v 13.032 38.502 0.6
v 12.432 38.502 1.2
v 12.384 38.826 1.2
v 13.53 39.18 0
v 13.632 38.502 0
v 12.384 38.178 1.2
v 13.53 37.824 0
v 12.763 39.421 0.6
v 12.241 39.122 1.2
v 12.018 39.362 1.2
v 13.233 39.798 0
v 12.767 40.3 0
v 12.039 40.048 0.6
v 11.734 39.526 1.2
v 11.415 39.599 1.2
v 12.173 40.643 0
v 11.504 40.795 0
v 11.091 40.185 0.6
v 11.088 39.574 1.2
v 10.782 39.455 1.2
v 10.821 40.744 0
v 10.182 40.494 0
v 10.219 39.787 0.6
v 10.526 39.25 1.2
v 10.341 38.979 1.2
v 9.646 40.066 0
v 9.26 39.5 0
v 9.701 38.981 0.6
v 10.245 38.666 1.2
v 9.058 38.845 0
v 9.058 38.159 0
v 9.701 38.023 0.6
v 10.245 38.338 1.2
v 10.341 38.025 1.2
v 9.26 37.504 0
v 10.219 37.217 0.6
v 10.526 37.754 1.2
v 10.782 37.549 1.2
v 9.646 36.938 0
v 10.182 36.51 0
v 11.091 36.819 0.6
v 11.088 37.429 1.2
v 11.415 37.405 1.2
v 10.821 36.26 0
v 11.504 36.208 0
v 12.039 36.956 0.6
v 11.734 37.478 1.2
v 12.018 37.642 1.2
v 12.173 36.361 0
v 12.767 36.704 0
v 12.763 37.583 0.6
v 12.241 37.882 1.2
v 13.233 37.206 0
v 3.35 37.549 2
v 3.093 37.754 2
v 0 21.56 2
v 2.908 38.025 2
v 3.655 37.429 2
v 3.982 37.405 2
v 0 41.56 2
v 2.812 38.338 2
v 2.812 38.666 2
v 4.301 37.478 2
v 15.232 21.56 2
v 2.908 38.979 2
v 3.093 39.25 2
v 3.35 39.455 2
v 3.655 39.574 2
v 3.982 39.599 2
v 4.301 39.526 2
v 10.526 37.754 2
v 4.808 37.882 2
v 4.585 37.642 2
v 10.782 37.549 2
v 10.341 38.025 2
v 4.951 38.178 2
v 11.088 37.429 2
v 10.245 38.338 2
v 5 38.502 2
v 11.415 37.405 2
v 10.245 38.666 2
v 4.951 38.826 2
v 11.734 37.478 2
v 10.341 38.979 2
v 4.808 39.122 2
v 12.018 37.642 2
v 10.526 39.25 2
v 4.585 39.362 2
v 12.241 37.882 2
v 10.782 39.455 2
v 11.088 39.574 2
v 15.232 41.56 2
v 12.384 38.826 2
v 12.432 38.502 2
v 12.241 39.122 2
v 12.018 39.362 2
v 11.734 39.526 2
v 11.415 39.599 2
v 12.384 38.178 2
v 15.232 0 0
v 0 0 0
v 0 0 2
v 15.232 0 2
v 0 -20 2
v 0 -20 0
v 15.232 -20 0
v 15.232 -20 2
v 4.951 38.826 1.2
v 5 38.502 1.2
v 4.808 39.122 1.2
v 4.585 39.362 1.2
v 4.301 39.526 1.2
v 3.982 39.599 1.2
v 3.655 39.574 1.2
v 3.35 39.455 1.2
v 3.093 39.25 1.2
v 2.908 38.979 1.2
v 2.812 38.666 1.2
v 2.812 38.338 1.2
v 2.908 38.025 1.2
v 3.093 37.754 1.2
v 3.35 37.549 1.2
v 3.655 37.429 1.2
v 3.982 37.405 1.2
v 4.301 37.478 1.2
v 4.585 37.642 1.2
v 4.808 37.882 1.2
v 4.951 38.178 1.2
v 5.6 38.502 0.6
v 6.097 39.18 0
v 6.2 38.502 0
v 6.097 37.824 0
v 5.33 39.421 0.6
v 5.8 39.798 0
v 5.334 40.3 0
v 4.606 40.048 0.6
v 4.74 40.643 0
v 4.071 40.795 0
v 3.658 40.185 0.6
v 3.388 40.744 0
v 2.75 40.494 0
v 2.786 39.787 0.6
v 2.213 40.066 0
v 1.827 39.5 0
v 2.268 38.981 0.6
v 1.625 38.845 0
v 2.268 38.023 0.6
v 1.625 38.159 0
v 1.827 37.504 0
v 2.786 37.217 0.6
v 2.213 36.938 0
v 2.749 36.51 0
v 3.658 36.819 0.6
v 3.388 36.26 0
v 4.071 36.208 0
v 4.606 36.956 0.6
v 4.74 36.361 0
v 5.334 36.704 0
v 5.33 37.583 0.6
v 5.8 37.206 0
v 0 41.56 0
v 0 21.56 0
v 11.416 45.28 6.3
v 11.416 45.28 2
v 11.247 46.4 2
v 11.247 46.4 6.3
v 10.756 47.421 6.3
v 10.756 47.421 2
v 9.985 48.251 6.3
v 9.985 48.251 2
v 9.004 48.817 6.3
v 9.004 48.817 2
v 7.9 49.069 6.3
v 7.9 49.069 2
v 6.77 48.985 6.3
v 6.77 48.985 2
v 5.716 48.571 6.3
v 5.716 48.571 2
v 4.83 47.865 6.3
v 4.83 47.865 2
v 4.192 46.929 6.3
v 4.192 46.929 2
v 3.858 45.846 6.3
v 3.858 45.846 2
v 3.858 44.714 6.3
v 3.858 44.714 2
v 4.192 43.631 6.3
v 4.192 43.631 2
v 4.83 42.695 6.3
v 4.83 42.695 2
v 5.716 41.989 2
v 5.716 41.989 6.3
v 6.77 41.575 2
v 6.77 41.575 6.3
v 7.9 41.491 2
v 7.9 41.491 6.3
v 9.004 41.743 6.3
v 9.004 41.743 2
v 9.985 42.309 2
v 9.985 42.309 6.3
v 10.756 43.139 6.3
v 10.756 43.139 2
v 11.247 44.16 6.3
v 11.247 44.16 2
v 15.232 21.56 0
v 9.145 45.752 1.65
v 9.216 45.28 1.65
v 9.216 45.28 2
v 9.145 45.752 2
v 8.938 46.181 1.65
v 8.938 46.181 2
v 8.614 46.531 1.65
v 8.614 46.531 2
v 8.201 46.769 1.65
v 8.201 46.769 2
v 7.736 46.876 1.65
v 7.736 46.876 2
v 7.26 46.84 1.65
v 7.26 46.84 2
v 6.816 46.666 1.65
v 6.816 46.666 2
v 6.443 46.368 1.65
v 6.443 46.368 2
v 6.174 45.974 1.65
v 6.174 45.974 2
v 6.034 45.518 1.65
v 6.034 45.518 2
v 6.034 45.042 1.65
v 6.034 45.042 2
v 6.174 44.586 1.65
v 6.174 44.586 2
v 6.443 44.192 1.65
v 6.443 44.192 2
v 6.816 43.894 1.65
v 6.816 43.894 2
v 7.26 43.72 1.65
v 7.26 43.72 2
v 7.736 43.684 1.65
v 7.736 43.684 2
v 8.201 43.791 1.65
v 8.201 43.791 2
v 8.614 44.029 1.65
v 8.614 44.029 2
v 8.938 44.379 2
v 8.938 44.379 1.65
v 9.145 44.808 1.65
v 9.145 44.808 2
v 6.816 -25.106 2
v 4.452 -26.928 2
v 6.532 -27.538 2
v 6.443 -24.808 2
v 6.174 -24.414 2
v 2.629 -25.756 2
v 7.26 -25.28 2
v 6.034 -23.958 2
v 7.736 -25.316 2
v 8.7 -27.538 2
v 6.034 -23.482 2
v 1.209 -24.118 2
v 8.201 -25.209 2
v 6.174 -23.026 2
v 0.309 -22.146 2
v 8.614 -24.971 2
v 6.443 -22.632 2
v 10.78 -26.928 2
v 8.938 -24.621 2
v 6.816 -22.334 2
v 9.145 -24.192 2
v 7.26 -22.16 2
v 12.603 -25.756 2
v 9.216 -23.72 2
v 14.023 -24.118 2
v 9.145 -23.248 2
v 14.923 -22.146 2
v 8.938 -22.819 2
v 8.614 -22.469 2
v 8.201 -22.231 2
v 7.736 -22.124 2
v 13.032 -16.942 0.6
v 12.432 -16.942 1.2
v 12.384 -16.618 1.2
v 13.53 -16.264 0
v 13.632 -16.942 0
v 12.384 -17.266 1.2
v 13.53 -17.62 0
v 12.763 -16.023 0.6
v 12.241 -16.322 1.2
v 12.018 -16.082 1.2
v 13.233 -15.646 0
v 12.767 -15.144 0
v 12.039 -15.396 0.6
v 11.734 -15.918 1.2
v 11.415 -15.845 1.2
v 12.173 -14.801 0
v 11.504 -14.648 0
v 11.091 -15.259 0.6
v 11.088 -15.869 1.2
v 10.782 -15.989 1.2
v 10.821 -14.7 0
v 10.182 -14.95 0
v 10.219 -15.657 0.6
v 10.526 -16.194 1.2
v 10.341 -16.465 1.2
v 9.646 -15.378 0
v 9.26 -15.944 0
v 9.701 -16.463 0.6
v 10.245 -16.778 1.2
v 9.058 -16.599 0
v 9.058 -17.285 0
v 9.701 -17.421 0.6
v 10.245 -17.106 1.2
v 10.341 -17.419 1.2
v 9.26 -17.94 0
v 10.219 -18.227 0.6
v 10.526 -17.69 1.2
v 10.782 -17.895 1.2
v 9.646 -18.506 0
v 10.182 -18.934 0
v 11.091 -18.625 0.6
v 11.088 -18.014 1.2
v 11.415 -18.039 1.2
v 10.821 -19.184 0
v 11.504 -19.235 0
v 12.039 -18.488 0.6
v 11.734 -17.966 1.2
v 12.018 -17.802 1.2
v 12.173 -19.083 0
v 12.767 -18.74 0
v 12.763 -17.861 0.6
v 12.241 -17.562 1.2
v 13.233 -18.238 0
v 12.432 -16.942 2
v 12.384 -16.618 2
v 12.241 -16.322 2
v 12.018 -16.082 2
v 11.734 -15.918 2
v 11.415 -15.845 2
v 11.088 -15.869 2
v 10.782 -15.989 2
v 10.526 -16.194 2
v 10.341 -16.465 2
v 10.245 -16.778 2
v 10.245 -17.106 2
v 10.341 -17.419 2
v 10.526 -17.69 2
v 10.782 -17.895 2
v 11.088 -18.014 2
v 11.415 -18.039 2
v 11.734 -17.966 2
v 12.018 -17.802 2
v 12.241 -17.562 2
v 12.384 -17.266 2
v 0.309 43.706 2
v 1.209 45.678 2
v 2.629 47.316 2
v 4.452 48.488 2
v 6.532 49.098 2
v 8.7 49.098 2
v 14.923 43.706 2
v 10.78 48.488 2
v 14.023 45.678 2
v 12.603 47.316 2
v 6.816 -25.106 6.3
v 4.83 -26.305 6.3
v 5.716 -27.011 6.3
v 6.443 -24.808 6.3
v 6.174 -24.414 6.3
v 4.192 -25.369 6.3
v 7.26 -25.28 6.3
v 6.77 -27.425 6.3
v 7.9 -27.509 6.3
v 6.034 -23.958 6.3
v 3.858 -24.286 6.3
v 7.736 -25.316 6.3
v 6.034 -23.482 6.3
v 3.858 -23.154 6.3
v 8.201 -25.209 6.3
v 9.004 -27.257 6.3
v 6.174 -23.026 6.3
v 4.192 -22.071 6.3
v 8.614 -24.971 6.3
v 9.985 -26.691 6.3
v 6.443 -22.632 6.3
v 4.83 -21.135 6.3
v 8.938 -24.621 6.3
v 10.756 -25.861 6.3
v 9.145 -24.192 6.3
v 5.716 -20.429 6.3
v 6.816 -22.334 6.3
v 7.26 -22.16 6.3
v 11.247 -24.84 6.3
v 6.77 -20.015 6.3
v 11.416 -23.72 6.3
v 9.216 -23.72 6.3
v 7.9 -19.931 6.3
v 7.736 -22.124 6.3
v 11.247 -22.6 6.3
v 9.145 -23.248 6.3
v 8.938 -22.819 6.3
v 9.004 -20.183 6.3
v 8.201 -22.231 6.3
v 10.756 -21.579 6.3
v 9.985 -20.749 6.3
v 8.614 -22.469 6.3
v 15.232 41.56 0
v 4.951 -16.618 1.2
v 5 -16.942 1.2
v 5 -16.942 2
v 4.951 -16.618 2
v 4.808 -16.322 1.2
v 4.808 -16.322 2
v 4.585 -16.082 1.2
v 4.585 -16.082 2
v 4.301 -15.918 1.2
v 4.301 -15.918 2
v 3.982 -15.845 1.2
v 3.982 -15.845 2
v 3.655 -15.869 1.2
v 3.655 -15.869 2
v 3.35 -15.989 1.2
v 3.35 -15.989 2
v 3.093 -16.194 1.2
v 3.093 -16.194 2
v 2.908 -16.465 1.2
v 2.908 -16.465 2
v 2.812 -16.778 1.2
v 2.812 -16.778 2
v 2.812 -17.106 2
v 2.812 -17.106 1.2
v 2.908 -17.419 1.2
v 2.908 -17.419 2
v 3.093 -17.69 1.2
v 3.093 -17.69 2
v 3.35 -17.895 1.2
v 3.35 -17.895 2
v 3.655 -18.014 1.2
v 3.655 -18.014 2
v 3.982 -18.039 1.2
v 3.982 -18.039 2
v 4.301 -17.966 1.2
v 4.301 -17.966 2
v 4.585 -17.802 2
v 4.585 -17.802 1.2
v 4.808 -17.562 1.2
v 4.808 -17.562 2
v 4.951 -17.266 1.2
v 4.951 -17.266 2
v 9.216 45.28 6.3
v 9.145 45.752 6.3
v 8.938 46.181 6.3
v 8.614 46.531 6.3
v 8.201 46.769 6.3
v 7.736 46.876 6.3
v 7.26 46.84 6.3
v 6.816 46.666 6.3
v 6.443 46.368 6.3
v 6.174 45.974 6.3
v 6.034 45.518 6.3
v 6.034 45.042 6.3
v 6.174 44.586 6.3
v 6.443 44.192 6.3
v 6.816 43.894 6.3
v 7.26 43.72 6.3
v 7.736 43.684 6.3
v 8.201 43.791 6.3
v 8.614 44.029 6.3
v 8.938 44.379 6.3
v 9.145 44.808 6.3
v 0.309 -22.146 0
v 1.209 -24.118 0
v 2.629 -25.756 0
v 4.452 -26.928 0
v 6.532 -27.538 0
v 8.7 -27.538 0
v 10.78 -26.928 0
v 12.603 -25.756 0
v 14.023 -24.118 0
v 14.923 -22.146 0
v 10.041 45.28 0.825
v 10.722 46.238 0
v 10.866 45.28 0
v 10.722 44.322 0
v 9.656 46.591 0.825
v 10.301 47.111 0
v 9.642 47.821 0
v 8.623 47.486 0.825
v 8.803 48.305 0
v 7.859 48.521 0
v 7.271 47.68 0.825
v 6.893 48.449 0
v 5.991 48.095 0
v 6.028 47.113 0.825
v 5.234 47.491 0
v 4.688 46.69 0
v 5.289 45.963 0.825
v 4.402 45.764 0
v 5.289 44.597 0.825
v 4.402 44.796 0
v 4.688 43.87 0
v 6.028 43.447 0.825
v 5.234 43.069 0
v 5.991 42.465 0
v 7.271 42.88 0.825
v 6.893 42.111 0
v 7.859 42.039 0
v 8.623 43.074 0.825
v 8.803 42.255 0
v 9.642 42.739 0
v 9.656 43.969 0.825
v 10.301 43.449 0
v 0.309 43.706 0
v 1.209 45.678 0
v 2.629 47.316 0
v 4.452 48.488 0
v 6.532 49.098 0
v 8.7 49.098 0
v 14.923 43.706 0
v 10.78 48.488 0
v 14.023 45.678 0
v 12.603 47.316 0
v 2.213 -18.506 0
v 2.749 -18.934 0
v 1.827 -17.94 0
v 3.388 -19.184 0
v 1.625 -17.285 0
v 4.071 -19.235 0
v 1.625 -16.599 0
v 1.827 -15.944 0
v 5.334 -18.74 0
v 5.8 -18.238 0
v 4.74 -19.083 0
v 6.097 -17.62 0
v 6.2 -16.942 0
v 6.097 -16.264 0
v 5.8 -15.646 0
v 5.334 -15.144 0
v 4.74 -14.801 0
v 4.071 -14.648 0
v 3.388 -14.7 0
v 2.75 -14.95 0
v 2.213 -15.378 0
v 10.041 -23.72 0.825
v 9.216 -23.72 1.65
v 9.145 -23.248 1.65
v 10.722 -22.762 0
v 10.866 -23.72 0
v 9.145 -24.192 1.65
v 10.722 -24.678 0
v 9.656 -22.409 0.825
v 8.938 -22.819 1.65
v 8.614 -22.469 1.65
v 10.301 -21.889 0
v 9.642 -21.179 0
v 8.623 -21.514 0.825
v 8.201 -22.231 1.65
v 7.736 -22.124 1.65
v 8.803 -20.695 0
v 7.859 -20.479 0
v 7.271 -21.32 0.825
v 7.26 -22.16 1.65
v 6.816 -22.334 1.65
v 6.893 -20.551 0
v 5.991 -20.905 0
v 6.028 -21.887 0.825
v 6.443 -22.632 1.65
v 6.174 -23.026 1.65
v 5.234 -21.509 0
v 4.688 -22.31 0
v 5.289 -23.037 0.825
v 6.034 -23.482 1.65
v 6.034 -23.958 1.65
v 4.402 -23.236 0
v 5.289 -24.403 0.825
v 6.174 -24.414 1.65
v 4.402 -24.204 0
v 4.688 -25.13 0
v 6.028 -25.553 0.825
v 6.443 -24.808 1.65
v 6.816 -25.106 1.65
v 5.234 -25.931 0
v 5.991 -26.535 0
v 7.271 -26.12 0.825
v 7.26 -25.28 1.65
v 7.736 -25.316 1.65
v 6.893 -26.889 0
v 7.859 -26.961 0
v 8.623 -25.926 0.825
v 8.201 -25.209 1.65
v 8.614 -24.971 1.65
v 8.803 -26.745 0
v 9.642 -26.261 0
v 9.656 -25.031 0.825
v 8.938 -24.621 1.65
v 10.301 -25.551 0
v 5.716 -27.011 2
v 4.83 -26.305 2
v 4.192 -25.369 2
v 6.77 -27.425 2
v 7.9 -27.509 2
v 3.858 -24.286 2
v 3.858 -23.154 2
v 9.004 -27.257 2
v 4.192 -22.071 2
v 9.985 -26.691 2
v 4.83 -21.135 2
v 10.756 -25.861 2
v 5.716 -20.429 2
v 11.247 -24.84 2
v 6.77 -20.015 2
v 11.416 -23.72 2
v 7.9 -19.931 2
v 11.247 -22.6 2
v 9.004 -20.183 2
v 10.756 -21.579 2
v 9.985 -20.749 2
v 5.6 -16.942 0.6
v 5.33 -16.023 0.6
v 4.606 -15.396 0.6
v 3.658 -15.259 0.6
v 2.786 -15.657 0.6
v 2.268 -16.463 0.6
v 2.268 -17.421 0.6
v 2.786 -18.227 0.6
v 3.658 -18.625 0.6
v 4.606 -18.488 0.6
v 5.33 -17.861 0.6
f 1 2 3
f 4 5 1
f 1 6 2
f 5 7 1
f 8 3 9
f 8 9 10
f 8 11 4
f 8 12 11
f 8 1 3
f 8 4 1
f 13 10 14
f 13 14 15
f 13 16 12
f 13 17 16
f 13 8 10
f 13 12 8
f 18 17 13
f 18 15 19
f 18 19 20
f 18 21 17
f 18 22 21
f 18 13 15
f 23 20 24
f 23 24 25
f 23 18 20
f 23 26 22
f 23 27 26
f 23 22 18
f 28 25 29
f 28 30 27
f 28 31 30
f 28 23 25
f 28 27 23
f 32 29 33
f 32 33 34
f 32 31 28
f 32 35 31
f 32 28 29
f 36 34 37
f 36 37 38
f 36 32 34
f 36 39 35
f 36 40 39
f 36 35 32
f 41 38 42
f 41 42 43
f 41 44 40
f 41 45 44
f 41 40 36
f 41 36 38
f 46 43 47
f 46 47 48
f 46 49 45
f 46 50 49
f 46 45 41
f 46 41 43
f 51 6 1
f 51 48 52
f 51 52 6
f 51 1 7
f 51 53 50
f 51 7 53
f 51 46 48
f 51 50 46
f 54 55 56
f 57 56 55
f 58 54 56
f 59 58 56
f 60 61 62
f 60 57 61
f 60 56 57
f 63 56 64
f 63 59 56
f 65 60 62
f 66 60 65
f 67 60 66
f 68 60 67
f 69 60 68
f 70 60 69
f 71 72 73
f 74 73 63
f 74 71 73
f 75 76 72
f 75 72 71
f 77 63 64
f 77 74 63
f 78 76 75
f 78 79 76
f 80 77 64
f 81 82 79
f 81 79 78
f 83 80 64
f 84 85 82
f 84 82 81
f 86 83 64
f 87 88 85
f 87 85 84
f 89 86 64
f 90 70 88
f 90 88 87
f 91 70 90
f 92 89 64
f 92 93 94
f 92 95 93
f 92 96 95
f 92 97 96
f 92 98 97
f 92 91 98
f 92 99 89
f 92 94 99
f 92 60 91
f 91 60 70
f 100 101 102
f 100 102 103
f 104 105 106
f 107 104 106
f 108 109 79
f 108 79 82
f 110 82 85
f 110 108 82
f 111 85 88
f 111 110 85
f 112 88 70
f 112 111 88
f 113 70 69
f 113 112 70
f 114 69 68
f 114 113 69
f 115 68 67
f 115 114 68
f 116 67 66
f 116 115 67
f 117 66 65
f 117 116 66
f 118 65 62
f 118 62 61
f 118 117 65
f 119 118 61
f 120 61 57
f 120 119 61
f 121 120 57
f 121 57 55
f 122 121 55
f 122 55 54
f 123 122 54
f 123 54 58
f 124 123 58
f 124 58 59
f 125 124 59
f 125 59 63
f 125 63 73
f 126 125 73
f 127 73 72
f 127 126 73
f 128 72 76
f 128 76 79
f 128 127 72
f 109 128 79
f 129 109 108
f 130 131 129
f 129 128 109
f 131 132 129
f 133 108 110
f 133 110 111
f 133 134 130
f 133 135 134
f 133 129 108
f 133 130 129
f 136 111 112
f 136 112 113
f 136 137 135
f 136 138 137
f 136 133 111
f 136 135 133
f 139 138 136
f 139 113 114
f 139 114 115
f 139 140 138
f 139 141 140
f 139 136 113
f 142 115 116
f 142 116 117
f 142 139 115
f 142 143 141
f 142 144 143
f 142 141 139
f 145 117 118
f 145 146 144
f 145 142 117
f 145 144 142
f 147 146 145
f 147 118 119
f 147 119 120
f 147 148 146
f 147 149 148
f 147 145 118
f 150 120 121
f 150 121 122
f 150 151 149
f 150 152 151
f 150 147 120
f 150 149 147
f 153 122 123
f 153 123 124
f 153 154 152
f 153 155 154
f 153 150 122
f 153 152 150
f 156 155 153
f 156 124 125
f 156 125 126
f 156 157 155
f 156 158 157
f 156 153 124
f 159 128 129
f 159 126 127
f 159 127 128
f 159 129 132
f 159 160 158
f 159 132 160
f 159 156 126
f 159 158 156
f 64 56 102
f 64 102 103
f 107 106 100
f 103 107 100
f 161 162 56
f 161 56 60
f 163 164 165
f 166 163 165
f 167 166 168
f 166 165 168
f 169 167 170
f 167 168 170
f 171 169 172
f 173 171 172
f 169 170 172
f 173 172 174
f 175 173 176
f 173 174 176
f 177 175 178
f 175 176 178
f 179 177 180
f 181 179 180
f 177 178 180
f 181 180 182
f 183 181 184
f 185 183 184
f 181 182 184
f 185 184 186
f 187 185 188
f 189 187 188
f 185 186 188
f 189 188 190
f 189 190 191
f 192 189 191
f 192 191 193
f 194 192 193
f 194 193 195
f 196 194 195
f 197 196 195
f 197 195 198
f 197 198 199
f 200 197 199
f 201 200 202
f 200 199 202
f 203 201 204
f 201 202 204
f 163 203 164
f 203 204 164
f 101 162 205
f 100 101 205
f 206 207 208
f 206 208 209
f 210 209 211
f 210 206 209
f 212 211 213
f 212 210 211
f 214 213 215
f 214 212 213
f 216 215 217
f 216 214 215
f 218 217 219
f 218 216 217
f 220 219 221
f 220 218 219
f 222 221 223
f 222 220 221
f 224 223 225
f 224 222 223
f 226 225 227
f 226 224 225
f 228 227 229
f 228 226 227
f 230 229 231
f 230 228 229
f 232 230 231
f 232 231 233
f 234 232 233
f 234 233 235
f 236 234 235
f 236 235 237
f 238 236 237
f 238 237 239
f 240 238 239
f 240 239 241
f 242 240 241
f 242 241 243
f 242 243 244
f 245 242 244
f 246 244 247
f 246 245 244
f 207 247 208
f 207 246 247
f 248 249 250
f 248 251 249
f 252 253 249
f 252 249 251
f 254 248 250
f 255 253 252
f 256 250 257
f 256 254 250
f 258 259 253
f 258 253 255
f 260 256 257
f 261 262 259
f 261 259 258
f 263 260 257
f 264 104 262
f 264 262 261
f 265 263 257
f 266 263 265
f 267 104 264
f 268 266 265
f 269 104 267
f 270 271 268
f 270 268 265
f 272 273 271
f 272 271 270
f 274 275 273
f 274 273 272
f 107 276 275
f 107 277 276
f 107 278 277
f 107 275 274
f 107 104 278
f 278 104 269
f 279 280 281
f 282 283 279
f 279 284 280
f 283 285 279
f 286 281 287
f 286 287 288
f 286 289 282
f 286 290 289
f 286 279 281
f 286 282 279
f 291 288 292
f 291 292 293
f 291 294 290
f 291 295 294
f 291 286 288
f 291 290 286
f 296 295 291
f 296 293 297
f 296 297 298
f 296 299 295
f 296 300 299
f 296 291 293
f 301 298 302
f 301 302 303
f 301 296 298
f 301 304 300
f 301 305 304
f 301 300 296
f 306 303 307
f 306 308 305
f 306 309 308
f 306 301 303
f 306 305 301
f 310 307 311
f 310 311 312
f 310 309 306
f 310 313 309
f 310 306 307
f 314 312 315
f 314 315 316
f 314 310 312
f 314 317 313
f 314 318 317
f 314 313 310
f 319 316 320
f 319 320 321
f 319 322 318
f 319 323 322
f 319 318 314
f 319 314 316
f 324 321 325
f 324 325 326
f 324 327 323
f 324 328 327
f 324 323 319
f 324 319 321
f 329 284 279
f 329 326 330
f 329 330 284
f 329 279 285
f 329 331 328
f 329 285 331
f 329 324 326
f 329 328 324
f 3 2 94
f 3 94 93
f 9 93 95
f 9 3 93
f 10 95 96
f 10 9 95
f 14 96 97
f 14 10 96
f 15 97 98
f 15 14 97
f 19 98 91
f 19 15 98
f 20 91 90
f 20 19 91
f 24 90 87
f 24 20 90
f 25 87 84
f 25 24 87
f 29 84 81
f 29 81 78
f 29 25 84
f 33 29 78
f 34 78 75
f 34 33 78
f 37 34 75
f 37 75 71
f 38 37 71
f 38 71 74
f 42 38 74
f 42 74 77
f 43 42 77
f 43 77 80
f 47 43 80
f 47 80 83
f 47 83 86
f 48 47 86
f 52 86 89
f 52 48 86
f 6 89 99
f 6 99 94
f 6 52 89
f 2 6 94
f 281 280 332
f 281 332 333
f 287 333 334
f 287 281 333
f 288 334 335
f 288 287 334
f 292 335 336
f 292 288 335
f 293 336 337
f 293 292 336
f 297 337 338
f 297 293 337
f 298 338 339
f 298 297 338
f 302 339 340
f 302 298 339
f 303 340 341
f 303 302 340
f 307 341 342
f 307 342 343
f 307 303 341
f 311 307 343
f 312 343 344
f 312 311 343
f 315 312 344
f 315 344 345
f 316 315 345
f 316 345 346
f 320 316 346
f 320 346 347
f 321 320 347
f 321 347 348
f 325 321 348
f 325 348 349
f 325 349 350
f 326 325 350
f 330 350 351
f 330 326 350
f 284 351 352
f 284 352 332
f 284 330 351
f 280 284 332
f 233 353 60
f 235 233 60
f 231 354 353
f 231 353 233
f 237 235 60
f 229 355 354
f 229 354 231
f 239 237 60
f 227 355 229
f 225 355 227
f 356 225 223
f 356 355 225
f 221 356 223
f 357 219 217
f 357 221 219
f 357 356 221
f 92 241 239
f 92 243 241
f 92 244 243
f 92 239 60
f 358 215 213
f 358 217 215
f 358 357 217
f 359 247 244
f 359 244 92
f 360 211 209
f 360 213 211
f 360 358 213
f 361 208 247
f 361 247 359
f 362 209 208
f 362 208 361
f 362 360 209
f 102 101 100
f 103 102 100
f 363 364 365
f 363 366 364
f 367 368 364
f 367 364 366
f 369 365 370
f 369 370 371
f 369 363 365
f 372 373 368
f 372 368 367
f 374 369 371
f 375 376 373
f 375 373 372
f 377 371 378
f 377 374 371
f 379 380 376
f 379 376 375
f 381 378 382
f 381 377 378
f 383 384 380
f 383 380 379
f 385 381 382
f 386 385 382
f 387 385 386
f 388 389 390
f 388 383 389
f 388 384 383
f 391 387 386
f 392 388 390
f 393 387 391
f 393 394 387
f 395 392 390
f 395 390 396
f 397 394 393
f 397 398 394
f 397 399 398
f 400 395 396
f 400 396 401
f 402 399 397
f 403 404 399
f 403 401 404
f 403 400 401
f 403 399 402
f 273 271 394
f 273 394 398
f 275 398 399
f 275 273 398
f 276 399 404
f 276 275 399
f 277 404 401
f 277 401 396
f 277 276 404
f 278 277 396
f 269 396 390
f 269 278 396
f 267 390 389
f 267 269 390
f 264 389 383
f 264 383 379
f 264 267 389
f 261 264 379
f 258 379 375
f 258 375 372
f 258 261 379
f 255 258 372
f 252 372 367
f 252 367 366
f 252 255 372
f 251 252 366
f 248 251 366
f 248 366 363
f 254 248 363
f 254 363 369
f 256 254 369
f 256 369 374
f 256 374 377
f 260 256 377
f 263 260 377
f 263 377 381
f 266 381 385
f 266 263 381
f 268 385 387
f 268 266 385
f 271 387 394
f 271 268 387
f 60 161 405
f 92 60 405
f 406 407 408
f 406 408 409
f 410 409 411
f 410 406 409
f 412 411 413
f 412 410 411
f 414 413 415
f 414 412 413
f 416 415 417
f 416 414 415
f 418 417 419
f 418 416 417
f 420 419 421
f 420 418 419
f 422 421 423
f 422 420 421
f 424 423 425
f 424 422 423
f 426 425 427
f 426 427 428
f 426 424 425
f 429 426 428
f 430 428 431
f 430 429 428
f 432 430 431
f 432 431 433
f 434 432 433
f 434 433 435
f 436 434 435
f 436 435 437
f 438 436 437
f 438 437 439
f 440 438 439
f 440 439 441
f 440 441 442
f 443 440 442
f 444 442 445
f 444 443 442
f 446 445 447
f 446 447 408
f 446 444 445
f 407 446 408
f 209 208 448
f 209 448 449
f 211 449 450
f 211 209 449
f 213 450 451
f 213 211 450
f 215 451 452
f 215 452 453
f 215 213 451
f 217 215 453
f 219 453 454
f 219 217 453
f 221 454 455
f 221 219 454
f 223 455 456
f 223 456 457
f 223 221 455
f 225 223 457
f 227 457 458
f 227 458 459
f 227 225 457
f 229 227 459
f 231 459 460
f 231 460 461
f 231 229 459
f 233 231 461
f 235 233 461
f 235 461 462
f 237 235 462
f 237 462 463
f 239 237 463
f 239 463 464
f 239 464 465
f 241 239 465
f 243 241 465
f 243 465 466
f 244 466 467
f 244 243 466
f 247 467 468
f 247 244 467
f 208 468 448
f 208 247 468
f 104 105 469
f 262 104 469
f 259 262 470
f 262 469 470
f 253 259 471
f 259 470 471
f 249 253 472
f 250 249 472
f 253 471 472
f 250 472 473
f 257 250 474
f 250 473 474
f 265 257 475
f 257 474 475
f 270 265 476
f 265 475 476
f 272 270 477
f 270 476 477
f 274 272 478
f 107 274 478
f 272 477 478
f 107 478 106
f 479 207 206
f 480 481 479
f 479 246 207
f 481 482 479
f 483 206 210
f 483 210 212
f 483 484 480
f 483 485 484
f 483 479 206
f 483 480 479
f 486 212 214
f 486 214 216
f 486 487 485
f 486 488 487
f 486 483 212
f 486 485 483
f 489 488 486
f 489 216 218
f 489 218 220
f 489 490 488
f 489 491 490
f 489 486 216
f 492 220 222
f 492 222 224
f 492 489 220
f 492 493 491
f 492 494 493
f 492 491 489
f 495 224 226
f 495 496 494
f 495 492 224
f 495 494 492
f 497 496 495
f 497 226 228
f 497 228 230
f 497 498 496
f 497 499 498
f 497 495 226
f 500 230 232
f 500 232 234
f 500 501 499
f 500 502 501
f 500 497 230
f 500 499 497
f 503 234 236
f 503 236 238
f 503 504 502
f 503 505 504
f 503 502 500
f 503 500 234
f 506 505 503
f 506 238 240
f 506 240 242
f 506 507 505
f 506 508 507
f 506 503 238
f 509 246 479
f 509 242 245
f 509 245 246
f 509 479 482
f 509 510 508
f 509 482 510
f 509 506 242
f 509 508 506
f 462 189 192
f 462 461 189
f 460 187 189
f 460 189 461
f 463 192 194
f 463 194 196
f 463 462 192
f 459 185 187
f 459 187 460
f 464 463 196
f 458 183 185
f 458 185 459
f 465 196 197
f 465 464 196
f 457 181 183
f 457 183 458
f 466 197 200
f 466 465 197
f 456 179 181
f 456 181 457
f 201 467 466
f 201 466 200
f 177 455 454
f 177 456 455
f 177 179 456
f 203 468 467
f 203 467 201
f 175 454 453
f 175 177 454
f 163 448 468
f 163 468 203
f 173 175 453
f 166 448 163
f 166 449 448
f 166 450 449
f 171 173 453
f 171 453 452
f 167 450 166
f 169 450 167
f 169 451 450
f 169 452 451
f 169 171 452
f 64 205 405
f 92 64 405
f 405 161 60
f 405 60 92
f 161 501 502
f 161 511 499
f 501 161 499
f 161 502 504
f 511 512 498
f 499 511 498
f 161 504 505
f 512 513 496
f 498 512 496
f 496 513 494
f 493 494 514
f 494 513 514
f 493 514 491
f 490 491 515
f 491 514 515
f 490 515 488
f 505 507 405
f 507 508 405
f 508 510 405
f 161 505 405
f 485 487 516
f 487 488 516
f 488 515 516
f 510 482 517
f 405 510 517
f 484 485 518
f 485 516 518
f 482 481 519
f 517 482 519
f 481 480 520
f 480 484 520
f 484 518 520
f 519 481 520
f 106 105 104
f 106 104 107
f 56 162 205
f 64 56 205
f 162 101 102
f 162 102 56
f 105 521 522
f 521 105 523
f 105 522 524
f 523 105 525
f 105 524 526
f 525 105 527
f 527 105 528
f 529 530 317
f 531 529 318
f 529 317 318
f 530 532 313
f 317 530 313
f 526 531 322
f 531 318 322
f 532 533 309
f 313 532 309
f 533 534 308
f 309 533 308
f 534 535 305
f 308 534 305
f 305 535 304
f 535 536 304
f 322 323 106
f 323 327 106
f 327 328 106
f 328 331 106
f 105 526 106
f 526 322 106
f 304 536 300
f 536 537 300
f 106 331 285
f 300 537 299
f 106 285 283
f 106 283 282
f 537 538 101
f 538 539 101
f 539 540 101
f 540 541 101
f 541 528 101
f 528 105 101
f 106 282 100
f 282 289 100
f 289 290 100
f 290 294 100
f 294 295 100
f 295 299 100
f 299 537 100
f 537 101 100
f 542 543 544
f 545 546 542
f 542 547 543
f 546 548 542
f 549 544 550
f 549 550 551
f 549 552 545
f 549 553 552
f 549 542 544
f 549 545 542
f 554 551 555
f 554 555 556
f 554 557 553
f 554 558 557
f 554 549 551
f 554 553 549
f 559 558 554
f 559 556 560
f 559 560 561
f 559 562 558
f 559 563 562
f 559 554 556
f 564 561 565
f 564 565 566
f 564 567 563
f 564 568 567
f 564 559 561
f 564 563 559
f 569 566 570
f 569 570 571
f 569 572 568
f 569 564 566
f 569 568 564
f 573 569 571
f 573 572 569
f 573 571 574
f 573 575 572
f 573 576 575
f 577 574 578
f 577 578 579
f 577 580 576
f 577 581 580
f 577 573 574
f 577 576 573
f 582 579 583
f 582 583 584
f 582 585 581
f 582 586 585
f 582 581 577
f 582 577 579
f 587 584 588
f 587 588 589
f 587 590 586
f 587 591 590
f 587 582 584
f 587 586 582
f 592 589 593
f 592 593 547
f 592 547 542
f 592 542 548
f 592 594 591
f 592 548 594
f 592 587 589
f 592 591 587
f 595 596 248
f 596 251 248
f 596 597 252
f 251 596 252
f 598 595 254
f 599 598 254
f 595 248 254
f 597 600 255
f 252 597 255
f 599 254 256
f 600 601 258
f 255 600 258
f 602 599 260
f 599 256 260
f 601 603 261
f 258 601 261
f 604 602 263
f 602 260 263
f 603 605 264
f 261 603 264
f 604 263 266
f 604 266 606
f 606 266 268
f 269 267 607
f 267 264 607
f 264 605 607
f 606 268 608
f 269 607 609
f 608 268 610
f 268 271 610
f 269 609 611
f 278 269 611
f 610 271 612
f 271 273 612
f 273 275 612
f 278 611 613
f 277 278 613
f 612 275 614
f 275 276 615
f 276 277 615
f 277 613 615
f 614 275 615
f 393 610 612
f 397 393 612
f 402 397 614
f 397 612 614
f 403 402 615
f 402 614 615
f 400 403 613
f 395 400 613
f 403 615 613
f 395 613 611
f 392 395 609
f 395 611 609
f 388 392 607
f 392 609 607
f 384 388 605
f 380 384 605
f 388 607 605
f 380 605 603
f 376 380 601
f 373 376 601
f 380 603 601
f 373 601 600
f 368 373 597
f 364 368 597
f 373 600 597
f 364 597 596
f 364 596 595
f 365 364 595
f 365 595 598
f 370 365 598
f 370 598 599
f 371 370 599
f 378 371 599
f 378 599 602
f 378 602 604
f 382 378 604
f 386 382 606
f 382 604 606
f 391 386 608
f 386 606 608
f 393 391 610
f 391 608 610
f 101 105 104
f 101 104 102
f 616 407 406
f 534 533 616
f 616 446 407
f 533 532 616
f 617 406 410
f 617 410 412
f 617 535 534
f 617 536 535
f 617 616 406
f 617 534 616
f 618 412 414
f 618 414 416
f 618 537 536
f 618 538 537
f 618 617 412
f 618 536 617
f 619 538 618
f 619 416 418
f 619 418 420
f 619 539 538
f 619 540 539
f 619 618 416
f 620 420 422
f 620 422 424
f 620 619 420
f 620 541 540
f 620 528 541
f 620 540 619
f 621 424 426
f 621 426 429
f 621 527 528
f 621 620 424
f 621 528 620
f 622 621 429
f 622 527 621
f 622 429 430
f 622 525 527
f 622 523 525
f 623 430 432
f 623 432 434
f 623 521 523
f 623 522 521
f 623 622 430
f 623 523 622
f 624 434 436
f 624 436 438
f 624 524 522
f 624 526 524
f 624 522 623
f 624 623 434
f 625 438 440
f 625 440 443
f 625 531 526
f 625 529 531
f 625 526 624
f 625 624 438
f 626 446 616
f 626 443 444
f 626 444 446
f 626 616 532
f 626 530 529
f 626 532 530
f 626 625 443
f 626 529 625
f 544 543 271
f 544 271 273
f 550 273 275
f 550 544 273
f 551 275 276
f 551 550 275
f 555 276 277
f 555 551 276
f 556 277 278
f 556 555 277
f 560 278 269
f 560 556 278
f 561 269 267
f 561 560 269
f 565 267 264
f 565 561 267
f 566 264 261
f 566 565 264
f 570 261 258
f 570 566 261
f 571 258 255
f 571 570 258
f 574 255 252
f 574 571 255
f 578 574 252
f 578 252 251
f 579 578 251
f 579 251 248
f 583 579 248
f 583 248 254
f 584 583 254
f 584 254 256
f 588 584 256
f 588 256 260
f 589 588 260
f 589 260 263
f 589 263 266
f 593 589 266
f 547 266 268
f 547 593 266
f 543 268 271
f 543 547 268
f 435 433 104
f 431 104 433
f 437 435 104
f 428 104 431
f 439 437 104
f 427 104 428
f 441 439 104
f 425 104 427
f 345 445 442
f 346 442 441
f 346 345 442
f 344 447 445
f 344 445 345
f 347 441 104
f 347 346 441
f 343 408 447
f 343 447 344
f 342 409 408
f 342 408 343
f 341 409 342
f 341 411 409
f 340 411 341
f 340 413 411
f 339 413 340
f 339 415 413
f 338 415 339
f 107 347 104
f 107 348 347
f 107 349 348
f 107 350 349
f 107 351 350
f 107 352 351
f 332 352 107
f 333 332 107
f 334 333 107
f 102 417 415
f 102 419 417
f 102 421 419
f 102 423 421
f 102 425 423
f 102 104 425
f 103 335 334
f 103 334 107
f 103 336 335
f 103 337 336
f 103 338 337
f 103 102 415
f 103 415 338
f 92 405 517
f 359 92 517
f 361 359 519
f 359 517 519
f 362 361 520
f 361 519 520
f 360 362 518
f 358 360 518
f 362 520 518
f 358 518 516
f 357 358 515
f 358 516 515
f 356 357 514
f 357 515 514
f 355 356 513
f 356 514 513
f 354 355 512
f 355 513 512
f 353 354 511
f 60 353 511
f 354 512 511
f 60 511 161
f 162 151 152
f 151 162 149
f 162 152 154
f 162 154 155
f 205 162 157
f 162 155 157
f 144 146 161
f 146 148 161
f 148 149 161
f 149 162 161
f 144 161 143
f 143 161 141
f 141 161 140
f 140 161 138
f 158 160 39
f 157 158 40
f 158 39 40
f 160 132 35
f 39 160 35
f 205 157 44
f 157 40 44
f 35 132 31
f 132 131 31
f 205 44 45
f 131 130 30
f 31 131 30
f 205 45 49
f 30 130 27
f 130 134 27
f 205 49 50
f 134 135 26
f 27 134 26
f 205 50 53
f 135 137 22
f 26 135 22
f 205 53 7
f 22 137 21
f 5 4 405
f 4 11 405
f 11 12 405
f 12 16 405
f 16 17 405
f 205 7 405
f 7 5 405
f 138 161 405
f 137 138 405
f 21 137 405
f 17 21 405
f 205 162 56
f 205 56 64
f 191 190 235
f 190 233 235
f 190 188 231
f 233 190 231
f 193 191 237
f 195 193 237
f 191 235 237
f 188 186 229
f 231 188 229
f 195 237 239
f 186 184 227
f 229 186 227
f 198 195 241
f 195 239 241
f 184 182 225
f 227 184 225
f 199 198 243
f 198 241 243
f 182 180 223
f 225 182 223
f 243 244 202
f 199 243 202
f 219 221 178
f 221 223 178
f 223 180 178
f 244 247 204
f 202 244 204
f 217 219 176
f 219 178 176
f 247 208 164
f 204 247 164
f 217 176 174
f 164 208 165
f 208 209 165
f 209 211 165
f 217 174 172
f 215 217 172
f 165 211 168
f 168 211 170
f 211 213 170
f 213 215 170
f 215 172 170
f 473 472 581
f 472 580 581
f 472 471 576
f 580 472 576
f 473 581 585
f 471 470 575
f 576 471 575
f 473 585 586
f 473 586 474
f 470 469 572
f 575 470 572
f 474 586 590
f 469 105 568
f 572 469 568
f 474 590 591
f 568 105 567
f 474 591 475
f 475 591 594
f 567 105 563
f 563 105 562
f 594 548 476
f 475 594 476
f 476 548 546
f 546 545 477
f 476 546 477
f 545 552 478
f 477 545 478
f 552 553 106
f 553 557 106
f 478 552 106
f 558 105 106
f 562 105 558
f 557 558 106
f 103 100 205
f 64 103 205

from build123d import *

# Parameters (mm, degrees)
SKETCH001_W     = 15.232
SKETCH001_H     = 20
SKETCH001_R     = 1.1
PAD001_DEPTH    = 2
CHAMFER002_SIZE = 1.2
SKETCH002_R     = 1.6
PAD_DEPTH       = 2
CHAMFER_SIZE    = 1.65
CHAMFER003_SIZE = 1.65
SKETCH_W        = 15.232
SKETCH_H        = 21.56
PAD002_DEPTH    = 2
SKETCH004_R     = 3.8
SKETCH004_R_2   = 1.6
PAD003_DEPTH    = 4.3


with BuildPart() as chamfer002:
    # Sketch001 → Pad001 (new body)
    with BuildSketch(Plane.XY):
        with Locations((7.616, -10)):
            Rectangle(SKETCH001_W, SKETCH001_H)
        with Locations((3.8995, -16.9419)):
            Circle(SKETCH001_R, mode=Mode.SUBTRACT)
        with Locations((11.3325, -16.9419)):
            Circle(SKETCH001_R, mode=Mode.SUBTRACT)
        with Locations((7.616, 31.56)):
            Rectangle(SKETCH001_W, SKETCH001_H)
        with Locations((3.8995, 38.5019)):
            Circle(SKETCH001_R, mode=Mode.SUBTRACT)
        with Locations((11.3325, 38.5019)):
            Circle(SKETCH001_R, mode=Mode.SUBTRACT)
    extrude(amount=PAD001_DEPTH)

    # Chamfer002
    chamfer002_edges = [chamfer002.edges().sort_by_distance(p)[0] for p in [
        (10.2325, -16.9419, 0),
        (2.7995, -16.9419, 0),
        (10.2325, 38.5019, 0),
        (2.7995, 38.5019, 0),
    ]]
    chamfer(chamfer002_edges, length=CHAMFER002_SIZE)


with BuildPart() as chamfer003:
    # Sketch002 → Pad (new body)
    with BuildSketch(Plane.XY):
        with BuildLine():
            ThreePointArc((15.232, 41.56), (7.616, 49.176), (0, 41.56))
            Line((0, 41.56), (15.232, 41.56))
        make_face()
        with Locations((7.616, 45.28)):
            Circle(SKETCH002_R, mode=Mode.SUBTRACT)
        with BuildLine():
            ThreePointArc((0, -20), (7.616, -27.616), (15.232, -20))
            Line((0, -20), (15.232, -20))
        make_face()
        with Locations((7.616, -23.72)):
            Circle(SKETCH002_R, mode=Mode.SUBTRACT)
    extrude(amount=PAD_DEPTH)

    # Chamfer
    chamfer_edges = [chamfer003.edges().sort_by_distance(p)[0] for p in [
        (6.016, 45.28, 0),
    ]]
    chamfer(chamfer_edges, length=CHAMFER_SIZE)

    # Chamfer003
    chamfer003_edges = [chamfer003.edges().sort_by_distance(p)[0] for p in [
        (6.016, -23.72, 0),
    ]]
    chamfer(chamfer003_edges, length=CHAMFER003_SIZE)


with BuildPart() as pad002:
    # Sketch → Pad002 (new body)
    with BuildSketch(Plane.XY):
        with Locations((7.616, 10.78)):
            Rectangle(SKETCH_W, SKETCH_H)
    extrude(amount=PAD002_DEPTH)


with BuildPart() as pad003:
    # Sketch004 → Pad003 (new body)
    with BuildSketch(Plane.XY.offset(2)):
        with Locations((7.616, 45.28)):
            Circle(SKETCH004_R)
        with Locations((7.616, 45.28)):
            Circle(SKETCH004_R_2, mode=Mode.SUBTRACT)
        with Locations((7.616, -23.72)):
            Circle(SKETCH004_R)
        with Locations((7.616, -23.72)):
            Circle(SKETCH004_R_2, mode=Mode.SUBTRACT)
    extrude(amount=PAD003_DEPTH)


solid = Compound([chamfer002.part, chamfer003.part, pad002.part, pad003.part])
